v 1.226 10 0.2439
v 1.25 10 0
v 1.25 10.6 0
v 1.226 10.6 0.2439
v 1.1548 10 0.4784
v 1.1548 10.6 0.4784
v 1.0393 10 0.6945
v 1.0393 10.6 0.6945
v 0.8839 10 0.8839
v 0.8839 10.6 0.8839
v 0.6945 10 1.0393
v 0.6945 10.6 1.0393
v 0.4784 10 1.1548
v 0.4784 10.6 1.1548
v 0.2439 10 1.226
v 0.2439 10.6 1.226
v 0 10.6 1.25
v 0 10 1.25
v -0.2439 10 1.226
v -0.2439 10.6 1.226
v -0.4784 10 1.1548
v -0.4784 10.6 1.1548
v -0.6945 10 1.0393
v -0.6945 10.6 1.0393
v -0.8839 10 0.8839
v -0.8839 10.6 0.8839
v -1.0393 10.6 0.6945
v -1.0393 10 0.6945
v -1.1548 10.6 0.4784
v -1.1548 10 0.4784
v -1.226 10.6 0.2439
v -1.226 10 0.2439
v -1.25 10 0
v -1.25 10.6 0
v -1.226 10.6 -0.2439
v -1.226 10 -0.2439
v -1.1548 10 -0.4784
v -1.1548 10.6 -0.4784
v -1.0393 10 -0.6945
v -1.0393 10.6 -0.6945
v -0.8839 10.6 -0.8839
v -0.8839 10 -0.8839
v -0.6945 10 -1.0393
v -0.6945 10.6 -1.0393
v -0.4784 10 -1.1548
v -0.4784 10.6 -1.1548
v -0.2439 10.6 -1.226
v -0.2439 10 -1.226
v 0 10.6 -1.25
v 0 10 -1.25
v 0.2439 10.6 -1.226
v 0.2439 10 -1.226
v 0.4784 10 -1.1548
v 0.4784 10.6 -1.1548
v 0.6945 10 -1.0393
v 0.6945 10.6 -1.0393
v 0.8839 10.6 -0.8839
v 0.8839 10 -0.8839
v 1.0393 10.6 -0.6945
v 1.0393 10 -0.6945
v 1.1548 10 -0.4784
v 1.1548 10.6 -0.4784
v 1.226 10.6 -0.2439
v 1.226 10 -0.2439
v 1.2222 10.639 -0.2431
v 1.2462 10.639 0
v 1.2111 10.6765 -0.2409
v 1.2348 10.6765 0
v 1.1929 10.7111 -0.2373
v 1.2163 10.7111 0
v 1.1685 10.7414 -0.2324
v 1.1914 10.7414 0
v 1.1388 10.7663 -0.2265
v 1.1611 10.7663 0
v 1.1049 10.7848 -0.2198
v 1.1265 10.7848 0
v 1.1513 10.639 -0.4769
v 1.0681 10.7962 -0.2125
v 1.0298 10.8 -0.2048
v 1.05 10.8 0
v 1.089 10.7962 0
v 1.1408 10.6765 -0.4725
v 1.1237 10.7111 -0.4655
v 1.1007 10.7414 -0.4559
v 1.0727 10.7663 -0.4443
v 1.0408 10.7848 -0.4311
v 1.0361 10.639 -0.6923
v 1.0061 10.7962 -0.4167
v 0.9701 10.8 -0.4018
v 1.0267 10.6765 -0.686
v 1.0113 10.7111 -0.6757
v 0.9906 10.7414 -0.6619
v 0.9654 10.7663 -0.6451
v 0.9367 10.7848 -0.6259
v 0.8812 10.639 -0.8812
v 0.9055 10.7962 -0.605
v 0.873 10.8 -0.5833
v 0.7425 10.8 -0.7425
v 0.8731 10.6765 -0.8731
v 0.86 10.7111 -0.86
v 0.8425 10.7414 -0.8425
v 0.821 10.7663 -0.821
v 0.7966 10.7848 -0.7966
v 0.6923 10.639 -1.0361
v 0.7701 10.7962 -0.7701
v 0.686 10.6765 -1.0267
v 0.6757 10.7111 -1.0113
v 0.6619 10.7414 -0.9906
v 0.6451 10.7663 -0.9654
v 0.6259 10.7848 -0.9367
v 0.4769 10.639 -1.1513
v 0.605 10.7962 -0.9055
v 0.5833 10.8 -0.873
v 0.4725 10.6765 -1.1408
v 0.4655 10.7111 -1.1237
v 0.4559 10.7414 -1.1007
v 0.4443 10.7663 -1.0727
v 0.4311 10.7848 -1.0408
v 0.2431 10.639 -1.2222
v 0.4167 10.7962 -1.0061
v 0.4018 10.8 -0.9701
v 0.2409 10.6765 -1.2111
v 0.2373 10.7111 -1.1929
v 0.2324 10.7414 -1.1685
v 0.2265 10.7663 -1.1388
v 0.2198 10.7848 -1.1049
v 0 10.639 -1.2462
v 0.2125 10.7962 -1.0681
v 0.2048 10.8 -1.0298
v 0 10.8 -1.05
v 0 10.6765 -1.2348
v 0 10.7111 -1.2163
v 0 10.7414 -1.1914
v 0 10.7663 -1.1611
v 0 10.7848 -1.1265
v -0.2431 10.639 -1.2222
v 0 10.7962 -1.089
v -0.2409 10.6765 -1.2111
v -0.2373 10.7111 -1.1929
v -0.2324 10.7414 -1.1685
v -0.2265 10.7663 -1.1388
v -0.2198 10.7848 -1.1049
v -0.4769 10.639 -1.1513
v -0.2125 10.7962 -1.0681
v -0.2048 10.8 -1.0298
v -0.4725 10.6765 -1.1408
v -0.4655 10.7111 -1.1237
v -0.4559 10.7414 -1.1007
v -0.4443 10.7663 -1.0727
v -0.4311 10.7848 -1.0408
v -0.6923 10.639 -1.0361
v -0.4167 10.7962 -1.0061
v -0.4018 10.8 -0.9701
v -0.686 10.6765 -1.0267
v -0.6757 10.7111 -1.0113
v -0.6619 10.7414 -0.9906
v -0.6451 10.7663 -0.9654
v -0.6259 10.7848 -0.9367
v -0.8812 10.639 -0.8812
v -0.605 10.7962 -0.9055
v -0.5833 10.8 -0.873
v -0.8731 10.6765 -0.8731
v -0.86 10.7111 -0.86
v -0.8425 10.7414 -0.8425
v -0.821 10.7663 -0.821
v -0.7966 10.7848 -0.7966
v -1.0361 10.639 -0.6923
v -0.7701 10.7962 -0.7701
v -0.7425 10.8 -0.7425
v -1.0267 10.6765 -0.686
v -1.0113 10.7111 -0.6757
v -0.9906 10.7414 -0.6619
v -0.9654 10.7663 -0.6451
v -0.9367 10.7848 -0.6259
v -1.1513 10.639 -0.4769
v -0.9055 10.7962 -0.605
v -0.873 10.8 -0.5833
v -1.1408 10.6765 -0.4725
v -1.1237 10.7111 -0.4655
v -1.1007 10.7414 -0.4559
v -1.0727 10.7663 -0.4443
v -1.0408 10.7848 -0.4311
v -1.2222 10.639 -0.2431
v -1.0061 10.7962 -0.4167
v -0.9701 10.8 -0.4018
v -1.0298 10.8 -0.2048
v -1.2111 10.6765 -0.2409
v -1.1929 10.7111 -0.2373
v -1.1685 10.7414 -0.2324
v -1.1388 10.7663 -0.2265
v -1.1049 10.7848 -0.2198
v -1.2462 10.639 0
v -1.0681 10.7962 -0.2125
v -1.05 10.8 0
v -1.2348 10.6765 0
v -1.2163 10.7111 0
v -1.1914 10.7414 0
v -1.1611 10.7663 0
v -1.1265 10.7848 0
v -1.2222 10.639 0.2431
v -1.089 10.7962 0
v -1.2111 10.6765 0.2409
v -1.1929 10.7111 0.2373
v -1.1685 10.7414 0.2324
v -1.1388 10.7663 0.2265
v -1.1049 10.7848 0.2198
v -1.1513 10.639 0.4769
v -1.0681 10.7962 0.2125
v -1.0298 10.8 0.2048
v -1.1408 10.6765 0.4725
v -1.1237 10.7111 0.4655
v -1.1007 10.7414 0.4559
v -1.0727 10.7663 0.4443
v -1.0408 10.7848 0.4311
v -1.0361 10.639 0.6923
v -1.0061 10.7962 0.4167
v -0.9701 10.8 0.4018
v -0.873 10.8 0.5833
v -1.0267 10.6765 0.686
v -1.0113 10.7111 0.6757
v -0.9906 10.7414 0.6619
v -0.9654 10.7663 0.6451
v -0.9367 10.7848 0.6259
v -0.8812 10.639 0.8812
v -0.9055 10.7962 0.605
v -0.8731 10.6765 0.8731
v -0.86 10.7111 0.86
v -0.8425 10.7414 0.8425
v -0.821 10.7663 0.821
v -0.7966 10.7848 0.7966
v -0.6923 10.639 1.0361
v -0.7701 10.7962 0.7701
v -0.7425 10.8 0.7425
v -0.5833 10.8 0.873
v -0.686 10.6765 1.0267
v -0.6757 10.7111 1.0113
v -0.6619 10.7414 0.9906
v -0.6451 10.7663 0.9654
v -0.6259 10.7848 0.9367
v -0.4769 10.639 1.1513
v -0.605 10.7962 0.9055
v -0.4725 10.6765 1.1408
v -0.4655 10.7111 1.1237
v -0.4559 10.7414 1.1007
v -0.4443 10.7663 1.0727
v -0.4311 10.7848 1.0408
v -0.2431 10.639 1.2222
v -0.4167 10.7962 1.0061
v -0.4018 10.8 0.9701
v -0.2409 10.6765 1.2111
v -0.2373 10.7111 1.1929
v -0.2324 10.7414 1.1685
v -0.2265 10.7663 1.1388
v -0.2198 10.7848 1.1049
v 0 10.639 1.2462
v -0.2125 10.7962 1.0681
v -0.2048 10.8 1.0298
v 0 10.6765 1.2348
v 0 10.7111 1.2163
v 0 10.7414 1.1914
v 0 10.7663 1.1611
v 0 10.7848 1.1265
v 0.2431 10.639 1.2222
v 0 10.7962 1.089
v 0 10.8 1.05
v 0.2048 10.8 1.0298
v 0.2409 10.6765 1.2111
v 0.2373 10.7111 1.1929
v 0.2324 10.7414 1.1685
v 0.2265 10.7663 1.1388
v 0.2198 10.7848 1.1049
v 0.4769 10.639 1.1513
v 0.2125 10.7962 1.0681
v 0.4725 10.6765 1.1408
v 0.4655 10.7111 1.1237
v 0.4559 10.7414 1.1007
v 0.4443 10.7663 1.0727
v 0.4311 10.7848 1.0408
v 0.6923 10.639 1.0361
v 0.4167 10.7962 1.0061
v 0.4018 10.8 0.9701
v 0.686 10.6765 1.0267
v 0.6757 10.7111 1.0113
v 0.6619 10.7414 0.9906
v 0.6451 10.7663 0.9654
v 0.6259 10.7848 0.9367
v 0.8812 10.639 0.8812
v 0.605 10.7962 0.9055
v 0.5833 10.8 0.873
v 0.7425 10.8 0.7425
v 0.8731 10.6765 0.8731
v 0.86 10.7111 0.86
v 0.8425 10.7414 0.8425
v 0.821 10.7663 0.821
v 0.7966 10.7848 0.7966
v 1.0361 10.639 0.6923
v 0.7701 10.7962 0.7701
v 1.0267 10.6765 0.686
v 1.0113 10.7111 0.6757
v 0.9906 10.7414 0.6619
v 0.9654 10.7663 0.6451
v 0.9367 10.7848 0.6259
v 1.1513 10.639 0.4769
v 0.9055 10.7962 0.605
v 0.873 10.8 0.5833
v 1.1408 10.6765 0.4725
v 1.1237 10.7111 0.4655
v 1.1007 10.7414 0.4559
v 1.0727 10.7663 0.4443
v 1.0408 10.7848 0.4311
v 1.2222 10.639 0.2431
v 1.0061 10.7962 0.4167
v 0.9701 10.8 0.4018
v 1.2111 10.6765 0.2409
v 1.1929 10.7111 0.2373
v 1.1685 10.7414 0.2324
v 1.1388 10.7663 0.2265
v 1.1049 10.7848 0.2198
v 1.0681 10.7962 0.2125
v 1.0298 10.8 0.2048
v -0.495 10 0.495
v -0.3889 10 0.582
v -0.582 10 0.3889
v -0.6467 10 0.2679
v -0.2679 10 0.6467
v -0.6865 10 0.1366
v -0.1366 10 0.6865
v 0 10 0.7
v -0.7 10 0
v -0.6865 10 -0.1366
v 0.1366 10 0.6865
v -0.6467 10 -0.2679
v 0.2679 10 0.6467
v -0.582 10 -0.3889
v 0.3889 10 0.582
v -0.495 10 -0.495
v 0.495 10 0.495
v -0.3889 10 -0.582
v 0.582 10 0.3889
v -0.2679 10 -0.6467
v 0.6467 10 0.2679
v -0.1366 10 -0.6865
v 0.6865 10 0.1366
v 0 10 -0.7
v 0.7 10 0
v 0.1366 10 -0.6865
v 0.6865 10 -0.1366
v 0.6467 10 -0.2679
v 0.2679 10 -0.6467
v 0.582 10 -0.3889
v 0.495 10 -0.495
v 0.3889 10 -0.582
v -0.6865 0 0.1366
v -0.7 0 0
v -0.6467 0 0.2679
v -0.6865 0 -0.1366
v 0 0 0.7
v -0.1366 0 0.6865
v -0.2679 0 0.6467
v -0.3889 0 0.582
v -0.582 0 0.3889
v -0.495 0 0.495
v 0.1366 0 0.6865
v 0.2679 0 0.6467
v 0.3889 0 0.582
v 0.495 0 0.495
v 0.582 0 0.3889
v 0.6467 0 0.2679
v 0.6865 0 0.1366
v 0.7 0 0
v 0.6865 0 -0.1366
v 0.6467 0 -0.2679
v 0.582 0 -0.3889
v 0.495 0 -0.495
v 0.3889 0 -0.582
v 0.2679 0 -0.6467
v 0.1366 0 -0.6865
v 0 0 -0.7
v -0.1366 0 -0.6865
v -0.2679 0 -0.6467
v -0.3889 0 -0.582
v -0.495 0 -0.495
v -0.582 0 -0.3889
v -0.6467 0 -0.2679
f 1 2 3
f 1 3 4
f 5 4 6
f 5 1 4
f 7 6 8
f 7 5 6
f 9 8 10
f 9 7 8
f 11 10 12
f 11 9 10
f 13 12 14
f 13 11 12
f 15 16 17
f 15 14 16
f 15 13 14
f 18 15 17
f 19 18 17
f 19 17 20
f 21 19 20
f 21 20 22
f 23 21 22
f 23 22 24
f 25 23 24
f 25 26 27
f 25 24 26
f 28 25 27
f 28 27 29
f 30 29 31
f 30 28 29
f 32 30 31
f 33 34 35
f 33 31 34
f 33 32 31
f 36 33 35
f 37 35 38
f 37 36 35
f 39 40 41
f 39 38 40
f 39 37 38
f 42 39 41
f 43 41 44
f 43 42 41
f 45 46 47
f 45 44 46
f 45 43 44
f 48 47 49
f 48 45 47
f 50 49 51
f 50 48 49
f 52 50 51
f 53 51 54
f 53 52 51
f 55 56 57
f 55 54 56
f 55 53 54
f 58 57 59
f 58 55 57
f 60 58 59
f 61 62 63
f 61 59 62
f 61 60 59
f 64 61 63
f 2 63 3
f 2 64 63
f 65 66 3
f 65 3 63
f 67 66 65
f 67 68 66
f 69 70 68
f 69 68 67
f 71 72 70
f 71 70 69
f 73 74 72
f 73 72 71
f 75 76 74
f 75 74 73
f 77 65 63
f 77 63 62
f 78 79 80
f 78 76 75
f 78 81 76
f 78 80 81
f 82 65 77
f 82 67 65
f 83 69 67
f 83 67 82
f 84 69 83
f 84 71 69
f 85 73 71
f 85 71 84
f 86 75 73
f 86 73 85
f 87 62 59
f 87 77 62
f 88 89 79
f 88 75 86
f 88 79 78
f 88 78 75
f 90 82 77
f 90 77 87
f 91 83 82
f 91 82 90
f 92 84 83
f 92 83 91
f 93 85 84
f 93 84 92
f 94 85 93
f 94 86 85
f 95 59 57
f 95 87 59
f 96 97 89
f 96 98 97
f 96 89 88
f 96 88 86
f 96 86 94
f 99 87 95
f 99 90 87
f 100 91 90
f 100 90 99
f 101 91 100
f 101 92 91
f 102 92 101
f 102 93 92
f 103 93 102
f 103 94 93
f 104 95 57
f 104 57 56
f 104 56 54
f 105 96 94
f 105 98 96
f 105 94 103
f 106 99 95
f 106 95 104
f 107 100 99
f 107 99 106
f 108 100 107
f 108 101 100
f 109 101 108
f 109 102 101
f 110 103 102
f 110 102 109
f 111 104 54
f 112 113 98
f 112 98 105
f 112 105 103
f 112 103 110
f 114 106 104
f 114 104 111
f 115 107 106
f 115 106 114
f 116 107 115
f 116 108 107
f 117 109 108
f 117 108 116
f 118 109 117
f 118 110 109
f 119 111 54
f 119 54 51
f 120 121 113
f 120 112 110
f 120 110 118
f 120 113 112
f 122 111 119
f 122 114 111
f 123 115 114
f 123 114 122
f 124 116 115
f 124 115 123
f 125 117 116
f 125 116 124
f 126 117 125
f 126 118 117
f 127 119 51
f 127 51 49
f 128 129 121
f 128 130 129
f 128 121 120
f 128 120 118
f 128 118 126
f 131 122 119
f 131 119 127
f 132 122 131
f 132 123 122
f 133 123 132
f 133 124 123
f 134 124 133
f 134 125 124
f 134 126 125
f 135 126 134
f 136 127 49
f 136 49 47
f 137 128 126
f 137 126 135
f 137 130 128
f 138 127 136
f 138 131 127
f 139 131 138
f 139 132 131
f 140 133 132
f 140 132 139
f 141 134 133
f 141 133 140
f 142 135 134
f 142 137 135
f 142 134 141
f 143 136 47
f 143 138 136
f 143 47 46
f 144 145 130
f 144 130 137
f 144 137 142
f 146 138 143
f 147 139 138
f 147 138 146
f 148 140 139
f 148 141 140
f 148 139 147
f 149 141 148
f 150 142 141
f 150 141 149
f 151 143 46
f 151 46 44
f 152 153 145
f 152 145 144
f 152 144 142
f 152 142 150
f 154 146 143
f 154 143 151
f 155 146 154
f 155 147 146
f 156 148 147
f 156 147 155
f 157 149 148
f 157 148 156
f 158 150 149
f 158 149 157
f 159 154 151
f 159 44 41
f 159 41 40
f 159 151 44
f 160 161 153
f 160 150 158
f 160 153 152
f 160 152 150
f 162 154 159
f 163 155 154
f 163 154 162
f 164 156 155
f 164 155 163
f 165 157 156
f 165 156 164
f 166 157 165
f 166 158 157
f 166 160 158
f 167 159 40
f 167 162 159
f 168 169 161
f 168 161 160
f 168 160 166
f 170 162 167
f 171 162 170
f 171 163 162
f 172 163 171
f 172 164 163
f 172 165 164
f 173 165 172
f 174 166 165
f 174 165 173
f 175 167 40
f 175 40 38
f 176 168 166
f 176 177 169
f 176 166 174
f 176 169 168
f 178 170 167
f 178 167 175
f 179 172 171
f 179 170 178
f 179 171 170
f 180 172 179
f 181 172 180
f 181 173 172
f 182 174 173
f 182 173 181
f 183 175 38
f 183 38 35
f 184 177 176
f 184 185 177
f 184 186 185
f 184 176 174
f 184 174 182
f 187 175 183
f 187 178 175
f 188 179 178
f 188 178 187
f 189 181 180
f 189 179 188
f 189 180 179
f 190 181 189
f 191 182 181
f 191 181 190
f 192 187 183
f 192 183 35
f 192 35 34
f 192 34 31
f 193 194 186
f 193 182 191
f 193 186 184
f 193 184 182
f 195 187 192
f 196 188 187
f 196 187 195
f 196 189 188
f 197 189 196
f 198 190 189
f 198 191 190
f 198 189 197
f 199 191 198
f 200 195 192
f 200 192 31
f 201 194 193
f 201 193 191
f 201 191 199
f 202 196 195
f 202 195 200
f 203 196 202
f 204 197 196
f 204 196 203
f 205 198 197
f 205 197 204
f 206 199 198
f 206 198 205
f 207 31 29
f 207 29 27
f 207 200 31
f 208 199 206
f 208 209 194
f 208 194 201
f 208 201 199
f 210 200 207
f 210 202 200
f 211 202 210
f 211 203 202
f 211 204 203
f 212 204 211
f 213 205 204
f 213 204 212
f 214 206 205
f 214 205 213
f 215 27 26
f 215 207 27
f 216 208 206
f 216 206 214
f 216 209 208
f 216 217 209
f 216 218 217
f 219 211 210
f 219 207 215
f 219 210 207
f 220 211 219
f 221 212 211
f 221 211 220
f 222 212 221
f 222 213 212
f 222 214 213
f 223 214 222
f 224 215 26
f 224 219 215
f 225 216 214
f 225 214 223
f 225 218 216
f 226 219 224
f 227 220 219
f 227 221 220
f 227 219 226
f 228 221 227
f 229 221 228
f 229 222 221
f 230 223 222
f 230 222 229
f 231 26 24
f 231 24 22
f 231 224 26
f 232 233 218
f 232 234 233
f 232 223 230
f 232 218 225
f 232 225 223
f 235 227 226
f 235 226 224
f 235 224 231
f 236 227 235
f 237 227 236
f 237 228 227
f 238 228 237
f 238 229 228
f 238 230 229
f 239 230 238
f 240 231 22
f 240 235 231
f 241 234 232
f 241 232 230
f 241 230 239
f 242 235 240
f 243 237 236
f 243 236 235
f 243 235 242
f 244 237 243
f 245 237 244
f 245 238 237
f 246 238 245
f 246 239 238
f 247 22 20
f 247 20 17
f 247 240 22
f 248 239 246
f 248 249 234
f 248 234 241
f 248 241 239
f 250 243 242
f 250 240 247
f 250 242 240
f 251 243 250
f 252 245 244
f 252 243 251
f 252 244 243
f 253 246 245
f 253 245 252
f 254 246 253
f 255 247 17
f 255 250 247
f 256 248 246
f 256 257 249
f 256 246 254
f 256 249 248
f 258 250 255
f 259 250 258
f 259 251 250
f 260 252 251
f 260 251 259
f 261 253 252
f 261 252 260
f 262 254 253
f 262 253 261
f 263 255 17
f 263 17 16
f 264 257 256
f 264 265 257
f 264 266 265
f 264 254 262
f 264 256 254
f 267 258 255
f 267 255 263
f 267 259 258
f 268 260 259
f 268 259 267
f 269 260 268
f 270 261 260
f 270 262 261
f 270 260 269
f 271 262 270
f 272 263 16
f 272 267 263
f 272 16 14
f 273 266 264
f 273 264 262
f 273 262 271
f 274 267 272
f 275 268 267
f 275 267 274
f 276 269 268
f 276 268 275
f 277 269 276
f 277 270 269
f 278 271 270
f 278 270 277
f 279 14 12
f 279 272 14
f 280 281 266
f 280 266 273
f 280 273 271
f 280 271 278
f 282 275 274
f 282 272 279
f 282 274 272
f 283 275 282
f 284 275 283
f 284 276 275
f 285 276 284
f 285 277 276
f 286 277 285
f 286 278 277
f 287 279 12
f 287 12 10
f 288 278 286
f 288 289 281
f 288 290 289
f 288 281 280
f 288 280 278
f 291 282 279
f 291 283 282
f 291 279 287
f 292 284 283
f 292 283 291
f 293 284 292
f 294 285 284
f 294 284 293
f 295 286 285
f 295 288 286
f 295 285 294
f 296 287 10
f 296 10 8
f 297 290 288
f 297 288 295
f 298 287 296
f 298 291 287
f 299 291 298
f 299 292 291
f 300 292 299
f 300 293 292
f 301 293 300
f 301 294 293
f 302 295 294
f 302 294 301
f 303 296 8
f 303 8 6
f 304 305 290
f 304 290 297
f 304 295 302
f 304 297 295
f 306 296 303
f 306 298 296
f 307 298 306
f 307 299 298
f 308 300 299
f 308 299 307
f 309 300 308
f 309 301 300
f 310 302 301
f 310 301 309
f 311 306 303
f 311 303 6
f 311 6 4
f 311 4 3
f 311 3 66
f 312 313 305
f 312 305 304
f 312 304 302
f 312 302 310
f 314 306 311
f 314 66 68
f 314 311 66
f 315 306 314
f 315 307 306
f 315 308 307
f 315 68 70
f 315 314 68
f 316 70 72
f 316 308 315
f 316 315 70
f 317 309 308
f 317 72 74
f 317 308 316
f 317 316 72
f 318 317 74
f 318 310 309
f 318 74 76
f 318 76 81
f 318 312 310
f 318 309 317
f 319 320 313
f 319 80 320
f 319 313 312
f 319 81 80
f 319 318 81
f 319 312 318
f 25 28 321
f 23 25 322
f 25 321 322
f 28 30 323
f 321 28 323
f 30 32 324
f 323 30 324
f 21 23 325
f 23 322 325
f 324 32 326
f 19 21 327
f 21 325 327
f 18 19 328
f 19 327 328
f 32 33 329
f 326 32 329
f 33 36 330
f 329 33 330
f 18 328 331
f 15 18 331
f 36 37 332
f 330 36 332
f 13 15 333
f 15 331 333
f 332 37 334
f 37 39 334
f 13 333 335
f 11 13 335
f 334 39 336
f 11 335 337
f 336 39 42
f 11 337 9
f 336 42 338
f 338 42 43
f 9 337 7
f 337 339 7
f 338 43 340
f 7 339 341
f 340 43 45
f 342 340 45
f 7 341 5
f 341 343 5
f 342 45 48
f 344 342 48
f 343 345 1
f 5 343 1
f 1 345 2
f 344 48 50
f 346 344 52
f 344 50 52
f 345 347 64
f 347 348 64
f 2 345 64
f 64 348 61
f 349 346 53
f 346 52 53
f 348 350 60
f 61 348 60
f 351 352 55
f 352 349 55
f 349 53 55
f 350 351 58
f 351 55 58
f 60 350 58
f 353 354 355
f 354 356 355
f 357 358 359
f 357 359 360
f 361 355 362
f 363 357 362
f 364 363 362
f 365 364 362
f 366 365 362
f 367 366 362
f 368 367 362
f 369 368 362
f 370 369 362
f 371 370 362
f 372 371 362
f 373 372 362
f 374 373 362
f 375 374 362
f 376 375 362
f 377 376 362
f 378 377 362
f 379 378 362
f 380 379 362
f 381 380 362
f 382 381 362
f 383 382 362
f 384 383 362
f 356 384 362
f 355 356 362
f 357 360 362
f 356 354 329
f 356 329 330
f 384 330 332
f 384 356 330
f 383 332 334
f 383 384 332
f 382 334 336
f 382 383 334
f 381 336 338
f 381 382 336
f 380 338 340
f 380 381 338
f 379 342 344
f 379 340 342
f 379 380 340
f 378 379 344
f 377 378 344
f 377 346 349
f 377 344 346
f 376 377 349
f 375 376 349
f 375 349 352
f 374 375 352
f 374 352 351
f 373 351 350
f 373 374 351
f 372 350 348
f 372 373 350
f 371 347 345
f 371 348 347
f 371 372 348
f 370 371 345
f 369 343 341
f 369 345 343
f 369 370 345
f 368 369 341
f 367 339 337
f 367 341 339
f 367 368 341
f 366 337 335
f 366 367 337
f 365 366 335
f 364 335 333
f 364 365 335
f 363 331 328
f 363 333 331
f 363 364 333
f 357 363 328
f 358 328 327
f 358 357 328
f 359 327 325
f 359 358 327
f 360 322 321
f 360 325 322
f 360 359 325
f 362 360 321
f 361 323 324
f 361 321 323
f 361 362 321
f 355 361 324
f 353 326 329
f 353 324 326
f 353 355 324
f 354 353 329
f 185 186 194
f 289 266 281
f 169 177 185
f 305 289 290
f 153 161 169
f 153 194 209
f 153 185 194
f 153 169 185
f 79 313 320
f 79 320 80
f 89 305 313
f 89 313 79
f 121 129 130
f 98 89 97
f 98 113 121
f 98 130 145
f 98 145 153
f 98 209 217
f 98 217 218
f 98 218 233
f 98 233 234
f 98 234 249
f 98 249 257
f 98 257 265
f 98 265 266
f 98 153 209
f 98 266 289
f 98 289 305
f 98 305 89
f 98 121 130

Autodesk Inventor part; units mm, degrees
ref_plane "YZ Plane" through (0, 0, 0) normal (1, 0, 0) x (0, 1, 0)
ref_plane "XZ Plane" through (0, 0, 0) normal (0, 1, 0) x (-1, 0, 0)
ref_plane "XY Plane" through (0, 0, 0) normal (0, 0, 1) x (1, 0, 0)
sketch "Sketch1" plane through (0, 0, 0) normal (0, 1, 0) x (-1, 0, 0)
  circle A0 centre (0, 0) radius 0.7
  dimension "d0" = 1.4
extrude "Extrusion1" add sketch "Sketch1" along normal blind 10
thread "Thread1" size "M1.4x0.3" class "6g" standard "ANSI Metric M Profile" full length
sketch "Sketch2" plane through (0, 10, 0) normal (0, 1, 0) x (1, 0, 0)
  circle A0 centre (0, 0) radius 1.25
  dimension "d5" = 2.5
extrude "Extrusion2" add sketch "Sketch2" along normal blind 0.8
fillet "Fillet1" radius 0.2 1 edges at (-1.25, 10.8, 0)
properties part number "m1_4_10mm_screw"
